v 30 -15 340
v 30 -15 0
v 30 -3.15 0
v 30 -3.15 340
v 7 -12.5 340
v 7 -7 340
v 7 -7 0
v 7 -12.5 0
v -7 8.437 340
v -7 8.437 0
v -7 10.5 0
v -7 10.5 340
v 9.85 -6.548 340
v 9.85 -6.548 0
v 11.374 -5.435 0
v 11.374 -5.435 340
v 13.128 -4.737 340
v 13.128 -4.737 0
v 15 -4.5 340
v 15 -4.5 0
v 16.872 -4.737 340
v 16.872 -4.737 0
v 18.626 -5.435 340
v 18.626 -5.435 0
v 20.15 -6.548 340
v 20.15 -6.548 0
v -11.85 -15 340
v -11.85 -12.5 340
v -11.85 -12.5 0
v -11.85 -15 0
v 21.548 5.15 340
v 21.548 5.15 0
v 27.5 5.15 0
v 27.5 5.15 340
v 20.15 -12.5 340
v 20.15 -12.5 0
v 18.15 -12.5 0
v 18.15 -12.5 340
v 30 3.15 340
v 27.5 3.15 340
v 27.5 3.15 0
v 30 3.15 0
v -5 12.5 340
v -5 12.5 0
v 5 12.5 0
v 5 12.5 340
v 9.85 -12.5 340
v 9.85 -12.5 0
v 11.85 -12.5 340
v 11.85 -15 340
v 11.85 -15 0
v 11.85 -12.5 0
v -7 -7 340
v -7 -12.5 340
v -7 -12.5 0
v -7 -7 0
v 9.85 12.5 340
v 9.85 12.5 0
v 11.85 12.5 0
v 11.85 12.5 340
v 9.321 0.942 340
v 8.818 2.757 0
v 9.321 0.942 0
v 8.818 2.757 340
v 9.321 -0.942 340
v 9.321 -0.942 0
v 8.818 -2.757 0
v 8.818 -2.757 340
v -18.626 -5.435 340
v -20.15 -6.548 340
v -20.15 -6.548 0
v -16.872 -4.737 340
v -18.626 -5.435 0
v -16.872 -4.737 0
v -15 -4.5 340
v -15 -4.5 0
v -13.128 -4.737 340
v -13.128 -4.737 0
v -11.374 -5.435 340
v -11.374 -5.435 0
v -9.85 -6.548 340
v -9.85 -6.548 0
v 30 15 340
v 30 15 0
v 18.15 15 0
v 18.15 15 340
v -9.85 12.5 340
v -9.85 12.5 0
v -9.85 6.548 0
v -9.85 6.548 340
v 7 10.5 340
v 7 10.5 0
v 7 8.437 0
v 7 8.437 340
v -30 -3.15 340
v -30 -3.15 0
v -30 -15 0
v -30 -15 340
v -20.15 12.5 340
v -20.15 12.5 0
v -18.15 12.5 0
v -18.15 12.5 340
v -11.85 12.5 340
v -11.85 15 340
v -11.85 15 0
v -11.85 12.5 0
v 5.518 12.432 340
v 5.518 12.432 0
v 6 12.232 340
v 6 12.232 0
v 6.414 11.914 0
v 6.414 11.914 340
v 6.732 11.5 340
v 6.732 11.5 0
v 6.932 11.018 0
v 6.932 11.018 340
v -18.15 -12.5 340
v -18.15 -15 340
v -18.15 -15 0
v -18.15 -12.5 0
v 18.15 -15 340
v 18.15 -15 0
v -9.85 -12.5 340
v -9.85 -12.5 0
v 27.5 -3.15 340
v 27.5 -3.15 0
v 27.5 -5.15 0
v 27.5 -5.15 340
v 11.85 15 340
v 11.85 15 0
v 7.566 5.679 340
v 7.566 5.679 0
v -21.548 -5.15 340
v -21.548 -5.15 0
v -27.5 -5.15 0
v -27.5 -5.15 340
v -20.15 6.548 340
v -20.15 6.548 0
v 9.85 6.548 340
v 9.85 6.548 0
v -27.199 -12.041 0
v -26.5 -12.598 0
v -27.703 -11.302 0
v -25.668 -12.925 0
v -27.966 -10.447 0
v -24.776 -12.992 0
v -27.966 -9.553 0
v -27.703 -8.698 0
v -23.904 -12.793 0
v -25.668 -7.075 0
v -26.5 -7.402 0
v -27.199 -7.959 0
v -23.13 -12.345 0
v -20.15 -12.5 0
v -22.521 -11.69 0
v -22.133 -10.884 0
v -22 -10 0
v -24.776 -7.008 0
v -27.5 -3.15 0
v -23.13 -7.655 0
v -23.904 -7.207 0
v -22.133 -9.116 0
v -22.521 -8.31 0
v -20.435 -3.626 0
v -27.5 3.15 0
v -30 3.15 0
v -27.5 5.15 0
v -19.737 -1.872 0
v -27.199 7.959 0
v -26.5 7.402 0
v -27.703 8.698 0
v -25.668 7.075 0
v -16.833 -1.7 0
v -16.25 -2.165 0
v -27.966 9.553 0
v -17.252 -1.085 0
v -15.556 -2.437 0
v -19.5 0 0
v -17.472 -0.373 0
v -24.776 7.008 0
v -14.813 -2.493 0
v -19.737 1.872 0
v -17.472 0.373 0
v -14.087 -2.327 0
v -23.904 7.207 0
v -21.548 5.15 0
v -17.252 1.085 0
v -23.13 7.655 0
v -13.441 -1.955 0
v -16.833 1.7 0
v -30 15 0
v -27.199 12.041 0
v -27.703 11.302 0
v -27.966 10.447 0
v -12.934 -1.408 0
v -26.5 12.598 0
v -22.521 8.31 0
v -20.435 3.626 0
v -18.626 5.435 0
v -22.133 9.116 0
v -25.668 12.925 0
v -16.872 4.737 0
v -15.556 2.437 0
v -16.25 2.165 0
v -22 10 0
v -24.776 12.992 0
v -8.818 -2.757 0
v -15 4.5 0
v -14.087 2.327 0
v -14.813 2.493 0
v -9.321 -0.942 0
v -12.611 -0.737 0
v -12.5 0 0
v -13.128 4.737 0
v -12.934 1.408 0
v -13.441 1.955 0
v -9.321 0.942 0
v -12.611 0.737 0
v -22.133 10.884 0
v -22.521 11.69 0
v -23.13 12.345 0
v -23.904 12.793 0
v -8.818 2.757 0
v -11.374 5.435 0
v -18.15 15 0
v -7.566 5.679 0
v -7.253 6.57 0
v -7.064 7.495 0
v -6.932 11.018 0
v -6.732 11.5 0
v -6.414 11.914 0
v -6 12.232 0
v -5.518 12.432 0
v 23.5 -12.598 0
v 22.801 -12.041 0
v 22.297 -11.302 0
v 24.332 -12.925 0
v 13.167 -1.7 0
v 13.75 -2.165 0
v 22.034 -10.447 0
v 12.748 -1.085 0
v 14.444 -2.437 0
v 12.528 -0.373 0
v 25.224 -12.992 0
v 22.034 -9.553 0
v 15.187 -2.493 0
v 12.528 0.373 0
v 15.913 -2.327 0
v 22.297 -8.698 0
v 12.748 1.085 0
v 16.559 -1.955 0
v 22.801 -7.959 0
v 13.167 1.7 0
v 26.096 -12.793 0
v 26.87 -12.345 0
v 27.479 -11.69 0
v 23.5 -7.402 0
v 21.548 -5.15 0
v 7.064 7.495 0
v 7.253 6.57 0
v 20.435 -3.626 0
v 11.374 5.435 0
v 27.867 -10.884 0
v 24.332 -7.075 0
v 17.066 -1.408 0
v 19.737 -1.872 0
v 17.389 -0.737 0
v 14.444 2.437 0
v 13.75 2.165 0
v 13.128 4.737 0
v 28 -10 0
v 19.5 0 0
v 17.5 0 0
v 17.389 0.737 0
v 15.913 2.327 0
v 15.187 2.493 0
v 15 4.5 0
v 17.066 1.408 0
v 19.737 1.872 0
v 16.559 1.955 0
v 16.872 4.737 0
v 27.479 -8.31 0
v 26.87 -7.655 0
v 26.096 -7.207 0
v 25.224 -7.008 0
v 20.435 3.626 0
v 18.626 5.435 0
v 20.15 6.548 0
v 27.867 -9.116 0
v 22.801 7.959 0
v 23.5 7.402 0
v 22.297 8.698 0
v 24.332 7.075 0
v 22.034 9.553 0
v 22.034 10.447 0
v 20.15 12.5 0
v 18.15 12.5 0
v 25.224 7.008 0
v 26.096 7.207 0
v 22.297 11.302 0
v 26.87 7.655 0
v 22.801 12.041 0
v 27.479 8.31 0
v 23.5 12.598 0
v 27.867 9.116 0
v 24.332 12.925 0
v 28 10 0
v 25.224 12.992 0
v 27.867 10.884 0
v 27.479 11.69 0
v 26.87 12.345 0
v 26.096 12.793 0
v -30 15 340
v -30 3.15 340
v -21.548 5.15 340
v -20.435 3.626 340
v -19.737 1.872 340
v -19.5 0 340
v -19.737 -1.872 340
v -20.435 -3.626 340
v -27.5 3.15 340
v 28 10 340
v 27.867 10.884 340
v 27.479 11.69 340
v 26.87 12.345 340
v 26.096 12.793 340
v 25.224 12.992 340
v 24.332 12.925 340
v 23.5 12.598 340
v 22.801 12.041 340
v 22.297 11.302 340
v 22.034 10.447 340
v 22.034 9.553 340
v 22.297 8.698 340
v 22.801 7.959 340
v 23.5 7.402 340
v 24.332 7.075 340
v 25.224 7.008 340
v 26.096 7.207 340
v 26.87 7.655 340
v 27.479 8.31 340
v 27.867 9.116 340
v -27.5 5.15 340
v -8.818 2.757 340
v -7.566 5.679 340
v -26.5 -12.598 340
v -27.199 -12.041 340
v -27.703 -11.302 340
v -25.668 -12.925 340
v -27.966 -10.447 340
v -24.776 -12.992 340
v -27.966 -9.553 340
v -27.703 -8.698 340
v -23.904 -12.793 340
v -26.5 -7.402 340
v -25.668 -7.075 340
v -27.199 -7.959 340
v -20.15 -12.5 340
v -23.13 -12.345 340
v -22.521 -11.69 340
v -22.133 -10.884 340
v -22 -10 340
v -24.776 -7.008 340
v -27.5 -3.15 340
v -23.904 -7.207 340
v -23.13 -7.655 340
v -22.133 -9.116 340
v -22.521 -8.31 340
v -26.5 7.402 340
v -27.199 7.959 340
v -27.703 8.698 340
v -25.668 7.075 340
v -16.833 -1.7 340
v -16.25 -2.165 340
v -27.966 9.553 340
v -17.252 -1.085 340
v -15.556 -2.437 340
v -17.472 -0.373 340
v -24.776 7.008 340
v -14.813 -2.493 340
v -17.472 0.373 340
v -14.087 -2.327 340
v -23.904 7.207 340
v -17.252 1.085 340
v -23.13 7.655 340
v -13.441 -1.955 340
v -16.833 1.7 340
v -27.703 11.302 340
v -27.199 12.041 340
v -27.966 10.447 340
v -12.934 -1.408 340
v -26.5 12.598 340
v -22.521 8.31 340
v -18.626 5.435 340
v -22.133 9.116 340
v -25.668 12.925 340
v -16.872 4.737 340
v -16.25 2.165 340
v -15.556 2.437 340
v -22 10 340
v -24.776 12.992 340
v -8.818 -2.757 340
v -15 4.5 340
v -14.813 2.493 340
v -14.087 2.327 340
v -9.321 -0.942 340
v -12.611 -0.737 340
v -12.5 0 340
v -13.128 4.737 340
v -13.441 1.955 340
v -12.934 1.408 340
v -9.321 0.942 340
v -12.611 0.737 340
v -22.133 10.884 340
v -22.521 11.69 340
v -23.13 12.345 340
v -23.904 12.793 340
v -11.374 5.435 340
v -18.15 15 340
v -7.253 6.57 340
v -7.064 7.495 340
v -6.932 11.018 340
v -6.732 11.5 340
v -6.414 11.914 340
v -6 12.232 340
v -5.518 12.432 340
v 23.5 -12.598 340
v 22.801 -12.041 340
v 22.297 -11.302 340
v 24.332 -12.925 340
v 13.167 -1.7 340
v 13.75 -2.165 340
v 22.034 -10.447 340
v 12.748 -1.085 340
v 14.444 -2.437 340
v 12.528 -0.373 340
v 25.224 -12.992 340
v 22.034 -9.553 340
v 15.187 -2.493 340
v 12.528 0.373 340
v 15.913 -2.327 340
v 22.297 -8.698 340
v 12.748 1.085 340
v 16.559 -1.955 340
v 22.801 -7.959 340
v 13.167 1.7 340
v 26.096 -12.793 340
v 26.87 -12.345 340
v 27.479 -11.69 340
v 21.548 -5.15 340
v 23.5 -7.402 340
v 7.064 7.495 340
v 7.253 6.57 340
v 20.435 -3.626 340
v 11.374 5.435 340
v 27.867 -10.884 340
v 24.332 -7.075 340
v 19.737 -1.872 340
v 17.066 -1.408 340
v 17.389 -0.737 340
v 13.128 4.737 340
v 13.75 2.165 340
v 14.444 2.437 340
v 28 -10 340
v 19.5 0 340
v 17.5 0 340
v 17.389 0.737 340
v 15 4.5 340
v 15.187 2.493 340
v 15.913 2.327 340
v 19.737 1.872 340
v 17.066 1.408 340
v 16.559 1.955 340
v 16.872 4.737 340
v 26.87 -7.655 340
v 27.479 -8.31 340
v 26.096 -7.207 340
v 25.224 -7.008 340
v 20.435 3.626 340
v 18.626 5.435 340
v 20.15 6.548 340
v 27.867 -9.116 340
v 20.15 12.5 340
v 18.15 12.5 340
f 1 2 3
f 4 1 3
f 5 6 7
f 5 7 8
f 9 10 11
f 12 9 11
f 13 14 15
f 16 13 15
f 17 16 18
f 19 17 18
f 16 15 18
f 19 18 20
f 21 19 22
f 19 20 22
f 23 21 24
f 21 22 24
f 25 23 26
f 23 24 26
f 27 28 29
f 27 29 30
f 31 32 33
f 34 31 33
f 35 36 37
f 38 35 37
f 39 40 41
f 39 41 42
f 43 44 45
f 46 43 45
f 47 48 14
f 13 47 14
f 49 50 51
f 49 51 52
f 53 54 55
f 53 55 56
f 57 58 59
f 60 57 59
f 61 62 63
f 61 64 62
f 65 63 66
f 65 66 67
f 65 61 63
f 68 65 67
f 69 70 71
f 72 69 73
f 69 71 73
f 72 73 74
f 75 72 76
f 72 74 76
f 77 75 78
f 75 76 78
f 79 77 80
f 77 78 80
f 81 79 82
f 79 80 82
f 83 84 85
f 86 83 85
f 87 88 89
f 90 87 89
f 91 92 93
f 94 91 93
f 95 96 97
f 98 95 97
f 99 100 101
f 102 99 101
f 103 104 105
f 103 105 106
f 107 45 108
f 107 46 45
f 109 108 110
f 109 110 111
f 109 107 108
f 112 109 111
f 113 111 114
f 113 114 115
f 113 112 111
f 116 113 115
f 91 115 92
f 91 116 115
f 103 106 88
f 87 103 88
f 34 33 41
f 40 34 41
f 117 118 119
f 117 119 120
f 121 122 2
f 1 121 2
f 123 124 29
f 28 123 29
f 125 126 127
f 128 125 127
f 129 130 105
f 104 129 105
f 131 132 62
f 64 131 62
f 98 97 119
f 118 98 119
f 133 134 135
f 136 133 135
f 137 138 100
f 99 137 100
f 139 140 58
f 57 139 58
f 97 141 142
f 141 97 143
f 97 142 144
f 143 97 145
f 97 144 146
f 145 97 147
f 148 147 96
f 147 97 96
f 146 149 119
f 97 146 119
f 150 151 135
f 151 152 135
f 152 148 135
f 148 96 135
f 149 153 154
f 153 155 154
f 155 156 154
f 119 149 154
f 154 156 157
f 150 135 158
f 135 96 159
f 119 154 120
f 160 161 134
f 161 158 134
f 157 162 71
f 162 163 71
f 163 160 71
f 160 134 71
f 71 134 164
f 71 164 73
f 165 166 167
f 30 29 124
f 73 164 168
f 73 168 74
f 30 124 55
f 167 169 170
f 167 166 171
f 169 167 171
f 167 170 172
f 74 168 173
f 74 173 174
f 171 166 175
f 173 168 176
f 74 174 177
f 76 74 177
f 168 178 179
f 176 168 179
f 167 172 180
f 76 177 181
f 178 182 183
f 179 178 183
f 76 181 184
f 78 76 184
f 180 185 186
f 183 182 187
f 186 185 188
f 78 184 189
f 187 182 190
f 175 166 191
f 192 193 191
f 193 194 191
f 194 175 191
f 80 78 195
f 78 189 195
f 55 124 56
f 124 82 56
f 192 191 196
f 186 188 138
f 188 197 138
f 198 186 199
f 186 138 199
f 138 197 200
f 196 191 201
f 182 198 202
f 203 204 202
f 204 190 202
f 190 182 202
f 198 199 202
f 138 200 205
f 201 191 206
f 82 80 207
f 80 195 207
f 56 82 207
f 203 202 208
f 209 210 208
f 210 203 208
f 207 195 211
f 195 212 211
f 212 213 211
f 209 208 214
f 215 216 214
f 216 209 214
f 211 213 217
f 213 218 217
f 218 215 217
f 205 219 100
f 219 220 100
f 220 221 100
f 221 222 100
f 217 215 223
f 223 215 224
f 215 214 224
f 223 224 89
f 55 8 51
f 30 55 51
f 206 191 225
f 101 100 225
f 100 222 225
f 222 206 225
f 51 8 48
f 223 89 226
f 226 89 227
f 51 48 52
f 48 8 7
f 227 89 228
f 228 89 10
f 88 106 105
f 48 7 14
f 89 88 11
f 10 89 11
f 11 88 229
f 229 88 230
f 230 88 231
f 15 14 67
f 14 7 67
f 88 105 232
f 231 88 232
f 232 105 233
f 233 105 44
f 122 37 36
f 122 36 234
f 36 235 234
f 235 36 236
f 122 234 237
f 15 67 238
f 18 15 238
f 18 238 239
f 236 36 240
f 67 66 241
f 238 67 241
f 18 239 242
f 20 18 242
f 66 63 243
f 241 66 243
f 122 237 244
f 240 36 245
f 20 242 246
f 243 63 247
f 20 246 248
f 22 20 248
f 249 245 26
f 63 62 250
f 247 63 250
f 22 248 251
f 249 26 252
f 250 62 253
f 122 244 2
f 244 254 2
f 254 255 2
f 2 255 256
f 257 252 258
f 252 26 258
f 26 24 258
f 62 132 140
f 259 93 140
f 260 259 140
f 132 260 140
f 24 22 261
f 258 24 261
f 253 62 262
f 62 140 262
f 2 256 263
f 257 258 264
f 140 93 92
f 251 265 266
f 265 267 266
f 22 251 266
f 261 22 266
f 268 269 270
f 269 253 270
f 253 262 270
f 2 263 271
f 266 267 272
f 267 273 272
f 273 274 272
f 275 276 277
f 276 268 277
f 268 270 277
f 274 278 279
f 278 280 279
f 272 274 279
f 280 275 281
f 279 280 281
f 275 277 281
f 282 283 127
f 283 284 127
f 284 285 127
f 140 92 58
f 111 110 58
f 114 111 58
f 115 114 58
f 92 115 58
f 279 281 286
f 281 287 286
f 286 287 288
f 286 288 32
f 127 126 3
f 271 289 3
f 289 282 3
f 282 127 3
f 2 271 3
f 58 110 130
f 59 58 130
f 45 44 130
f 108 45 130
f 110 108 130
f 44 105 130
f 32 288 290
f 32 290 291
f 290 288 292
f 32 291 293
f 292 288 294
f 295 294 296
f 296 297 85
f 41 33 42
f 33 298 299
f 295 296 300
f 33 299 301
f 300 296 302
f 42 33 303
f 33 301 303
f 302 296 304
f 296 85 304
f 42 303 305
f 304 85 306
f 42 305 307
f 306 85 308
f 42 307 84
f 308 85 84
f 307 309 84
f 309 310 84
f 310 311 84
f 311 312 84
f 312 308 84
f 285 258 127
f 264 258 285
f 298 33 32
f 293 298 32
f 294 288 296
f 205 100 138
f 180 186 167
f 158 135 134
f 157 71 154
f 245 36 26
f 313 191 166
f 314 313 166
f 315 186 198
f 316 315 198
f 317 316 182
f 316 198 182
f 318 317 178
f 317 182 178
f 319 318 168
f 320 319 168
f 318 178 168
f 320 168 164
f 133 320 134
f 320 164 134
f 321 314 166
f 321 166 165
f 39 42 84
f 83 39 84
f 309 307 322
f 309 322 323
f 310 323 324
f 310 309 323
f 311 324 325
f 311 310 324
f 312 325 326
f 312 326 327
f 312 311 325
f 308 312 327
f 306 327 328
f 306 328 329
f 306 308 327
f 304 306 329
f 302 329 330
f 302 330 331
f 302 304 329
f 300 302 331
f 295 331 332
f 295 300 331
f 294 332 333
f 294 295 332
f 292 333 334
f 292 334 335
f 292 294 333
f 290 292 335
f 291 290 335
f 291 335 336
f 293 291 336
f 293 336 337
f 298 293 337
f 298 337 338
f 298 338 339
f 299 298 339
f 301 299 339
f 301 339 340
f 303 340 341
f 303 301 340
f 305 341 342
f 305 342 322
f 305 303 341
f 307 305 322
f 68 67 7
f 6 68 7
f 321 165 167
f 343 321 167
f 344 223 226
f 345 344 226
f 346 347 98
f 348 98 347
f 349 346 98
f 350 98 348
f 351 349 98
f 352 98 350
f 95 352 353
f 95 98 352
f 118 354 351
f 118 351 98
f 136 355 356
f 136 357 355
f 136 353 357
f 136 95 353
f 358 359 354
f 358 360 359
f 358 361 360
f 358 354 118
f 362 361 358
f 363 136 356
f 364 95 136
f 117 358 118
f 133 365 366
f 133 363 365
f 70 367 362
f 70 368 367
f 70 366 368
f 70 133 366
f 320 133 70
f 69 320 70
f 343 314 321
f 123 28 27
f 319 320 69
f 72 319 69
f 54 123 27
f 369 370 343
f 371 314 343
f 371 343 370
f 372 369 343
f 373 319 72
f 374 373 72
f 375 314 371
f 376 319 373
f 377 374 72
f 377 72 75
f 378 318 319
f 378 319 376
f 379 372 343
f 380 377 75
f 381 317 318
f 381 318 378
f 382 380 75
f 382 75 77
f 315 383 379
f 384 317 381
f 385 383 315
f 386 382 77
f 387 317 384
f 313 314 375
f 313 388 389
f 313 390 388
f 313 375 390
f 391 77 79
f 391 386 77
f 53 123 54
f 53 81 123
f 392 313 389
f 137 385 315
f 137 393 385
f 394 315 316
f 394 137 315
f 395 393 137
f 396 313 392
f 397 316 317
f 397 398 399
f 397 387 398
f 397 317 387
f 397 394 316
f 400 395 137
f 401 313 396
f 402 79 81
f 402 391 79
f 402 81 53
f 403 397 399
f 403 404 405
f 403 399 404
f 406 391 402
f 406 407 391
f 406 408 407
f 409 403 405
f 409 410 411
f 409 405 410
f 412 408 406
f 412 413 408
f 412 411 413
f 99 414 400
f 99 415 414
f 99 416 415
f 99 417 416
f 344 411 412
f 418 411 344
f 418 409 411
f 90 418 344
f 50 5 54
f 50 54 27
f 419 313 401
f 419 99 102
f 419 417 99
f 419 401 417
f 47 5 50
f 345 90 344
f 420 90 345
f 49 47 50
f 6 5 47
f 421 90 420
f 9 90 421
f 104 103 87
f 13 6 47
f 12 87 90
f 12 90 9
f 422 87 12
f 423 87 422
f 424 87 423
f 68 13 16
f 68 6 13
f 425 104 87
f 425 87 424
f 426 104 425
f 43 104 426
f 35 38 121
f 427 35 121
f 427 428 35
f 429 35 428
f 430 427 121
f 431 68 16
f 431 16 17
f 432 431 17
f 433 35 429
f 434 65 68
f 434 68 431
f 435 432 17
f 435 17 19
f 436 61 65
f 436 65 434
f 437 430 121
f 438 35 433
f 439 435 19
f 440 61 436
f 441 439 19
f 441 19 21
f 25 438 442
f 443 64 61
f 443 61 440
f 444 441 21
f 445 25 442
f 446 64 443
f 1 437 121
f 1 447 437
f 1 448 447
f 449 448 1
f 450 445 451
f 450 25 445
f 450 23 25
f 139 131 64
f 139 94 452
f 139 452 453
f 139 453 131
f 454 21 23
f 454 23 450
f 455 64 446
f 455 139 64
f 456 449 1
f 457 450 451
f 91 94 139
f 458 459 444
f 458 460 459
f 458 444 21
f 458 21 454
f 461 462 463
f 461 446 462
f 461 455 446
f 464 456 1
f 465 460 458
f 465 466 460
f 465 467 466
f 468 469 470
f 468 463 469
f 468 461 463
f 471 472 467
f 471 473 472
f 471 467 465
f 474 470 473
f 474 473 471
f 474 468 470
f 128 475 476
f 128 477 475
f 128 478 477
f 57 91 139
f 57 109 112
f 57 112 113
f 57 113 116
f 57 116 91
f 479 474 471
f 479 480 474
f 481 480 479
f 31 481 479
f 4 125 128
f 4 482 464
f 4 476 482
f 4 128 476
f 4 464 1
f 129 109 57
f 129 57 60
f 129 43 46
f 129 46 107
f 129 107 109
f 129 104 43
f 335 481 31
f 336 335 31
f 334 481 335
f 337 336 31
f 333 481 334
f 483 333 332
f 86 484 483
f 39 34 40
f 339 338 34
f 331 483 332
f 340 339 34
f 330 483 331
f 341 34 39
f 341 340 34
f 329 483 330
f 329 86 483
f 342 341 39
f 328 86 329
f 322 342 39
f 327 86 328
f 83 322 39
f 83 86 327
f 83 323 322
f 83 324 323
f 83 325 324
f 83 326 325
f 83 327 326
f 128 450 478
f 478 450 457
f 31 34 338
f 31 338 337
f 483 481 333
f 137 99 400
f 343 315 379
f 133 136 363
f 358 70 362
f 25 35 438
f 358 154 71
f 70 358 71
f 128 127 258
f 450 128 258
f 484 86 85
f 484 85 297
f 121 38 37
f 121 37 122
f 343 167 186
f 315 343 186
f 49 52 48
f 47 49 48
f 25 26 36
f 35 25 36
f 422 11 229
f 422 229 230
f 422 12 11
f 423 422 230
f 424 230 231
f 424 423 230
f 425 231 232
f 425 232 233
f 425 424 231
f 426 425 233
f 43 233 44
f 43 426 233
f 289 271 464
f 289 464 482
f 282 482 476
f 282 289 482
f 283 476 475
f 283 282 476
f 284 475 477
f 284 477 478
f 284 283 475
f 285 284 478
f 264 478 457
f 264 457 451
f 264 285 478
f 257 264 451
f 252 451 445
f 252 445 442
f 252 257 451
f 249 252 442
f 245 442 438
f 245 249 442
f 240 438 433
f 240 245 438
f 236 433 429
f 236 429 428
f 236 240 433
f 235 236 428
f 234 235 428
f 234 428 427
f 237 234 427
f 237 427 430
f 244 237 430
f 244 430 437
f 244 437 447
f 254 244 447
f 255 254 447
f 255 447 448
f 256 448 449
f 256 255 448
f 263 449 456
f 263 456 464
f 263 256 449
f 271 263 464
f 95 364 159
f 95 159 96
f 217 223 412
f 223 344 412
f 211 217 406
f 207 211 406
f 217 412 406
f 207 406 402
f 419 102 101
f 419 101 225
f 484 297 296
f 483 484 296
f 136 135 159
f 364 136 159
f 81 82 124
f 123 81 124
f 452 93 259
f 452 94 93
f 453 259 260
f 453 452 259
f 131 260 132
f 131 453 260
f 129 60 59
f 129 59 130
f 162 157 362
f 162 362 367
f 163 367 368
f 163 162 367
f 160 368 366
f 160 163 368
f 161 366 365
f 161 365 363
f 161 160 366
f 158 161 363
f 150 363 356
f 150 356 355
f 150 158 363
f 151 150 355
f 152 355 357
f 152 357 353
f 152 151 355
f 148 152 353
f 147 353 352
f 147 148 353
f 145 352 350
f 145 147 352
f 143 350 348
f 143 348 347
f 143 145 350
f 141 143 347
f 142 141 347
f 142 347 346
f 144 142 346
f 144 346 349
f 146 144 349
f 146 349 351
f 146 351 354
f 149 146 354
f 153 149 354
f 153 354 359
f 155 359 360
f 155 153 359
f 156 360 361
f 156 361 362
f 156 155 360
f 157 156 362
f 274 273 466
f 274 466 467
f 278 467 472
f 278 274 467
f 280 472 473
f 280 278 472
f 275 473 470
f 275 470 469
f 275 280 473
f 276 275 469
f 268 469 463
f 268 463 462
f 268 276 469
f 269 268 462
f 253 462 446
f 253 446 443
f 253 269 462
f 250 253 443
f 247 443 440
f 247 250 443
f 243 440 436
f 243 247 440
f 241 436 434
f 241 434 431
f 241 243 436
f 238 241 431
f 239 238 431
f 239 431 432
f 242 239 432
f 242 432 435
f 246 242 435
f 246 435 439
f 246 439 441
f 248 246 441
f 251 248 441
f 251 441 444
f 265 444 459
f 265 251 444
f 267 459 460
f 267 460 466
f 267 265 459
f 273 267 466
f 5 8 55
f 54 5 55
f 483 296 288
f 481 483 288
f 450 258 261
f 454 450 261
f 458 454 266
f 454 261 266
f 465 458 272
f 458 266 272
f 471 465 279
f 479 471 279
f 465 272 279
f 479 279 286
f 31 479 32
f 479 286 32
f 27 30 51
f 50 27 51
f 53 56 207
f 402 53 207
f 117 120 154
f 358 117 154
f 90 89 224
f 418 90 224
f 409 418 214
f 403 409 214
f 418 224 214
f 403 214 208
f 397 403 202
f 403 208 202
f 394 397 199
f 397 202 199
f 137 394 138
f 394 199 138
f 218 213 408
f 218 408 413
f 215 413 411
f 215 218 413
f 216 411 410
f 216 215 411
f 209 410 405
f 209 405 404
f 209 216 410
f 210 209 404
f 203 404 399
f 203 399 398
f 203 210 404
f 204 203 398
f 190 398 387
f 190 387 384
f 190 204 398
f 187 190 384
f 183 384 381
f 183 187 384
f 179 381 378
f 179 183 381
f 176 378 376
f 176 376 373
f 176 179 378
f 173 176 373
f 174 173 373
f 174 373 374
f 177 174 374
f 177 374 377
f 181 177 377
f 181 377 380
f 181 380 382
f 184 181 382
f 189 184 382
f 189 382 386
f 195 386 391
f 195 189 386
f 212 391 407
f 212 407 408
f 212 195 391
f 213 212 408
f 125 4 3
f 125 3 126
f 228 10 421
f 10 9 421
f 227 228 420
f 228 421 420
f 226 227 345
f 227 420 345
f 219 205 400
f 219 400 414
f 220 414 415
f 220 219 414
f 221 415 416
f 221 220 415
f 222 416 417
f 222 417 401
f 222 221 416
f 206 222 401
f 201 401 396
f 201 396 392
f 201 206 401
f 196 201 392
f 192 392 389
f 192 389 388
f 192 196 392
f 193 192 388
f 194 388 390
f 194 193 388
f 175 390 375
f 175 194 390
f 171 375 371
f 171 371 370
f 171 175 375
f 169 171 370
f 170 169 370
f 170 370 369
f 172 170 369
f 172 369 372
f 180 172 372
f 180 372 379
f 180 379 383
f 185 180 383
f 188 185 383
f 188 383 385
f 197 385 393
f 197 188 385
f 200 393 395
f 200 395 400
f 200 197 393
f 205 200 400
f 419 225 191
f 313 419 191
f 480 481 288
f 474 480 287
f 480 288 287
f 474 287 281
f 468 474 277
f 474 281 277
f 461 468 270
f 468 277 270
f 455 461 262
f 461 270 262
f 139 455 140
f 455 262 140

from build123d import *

# Parameters (mm, degrees)
F0_R     = 3
F0_R_2   = 2.5
F1_DEPTH = 340
F2_R     = 2
F3_R     = 7


# Not quite as in the source:
# - a feature names something its author has since deleted; it is built from what else it names


with BuildPart() as f1:
    # F0 (on Top) → F1 (new body)
    with BuildSketch(Plane.XY):
        with BuildLine():
            Line((18.15, -15), (30, -15))
            Line((30, -15), (30, -3.15))
            Line((30, -3.15), (27.5, -3.15))
            Line((27.5, -3.15), (27.5, -5.15))
            Line((27.5, -5.15), (21.5477069044, -5.15))
            ThreePointArc((21.5477069044, -5.15), (19.5, 0), (21.5477069044, 5.15))
            Line((21.5477069044, 5.15), (27.5, 5.15))
            Line((27.5, 5.15), (27.5, 3.15))
            Line((27.5, 3.15), (30, 3.15))
            Line((30, 3.15), (30, 15))
            Line((30, 15), (18.15, 15))
            Line((18.15, 15), (18.15, 12.5))
            Line((18.15, 12.5), (20.15, 12.5))
            Line((20.15, 12.5), (20.15, 6.5477069044))
            ThreePointArc((20.15, 6.5477069044), (15, 4.5), (9.85, 6.5477069044))
            Line((9.85, 6.5477069044), (9.85, 12.5))
            Line((9.85, 12.5), (11.85, 12.5))
            Line((11.85, 12.5), (11.85, 15))
            Line((11.85, 15), (-11.85, 15))
            Line((-11.85, 15), (-11.85, 12.5))
            Line((-11.85, 12.5), (-9.85, 12.5))
            Line((-9.85, 12.5), (-9.85, 6.5477069044))
            ThreePointArc((-9.85, 6.5477069044), (-15, 4.5), (-20.15, 6.5477069044))
            Line((-20.15, 6.5477069044), (-20.15, 12.5))
            Line((-20.15, 12.5), (-18.15, 12.5))
            Line((-18.15, 12.5), (-18.15, 15))
            Line((-18.15, 15), (-30, 15))
            Line((-30, 15), (-30, 3.15))
            Line((-30, 3.15), (-27.5, 3.15))
            Line((-27.5, 3.15), (-27.5, 5.15))
            Line((-27.5, 5.15), (-21.5477069044, 5.15))
            ThreePointArc((-21.5477069044, 5.15), (-19.5, 0), (-21.5477069044, -5.15))
            Line((-21.5477069044, -5.15), (-27.5, -5.15))
            Line((-27.5, -5.15), (-27.5, -3.15))
            Line((-27.5, -3.15), (-30, -3.15))
            Line((-30, -3.15), (-30, -15))
            Line((-30, -15), (-18.15, -15))
            Line((-18.15, -15), (-18.15, -12.5))
            Line((-18.15, -12.5), (-20.15, -12.5))
            Line((-20.15, -12.5), (-20.15, -6.5477069044))
            ThreePointArc((-20.15, -6.5477069044), (-15, -4.5), (-9.85, -6.5477069044))
            Line((-9.85, -6.5477069044), (-9.85, -12.5))
            Line((-9.85, -12.5), (-11.85, -12.5))
            Line((-11.85, -12.5), (-11.85, -15))
            Line((-11.85, -15), (11.85, -15))
            Line((11.85, -15), (11.85, -12.5))
            Line((11.85, -12.5), (9.85, -12.5))
            Line((9.85, -12.5), (9.85, -6.5477069044))
            ThreePointArc((9.85, -6.5477069044), (15, -4.5), (20.15, -6.5477069044))
            Line((20.15, -6.5477069044), (20.15, -12.5))
            Line((20.15, -12.5), (18.15, -12.5))
            Line((18.15, -12.5), (18.15, -15))
        make_face()
        with Locations((-25, -10)):
            Circle(F0_R, mode=Mode.SUBTRACT)
        with Locations((25, -10)):
            Circle(F0_R, mode=Mode.SUBTRACT)
        with Locations((-15, 0)):
            Circle(F0_R_2, mode=Mode.SUBTRACT)
        with Locations((-25, 10)):
            Circle(F0_R, mode=Mode.SUBTRACT)
        Polygon((-7, 7), (-7, 12.5), (0, 12.5), (7, 12.5), (7, 7), (10, 0), (7, -7), (7, -12.5), (0, -12.5), (-7, -12.5), (-7, -7), (-10, 0), align=None, mode=Mode.SUBTRACT)
        with Locations((15, 0)):
            Circle(F0_R_2, mode=Mode.SUBTRACT)
        with Locations((25, 10)):
            Circle(F0_R, mode=Mode.SUBTRACT)
    extrude(amount=F1_DEPTH)

    # F2
    f2_edges = [f1.edges().sort_by_distance(p)[0] for p in [
        (-7, 12.5, 170),
        (7, 12.5, 170),
    ]]
    fillet(f2_edges, radius=F2_R)

    # F3
    f3_edges = [f1.edges().sort_by_distance(p)[0] for p in [
        (-7, 7, 170),
        (-10, 0, 170),
        (7, 7, 170),
        (10, 0, 170),
    ]]
    fillet(f3_edges, radius=F3_R)


solid = f1.part
